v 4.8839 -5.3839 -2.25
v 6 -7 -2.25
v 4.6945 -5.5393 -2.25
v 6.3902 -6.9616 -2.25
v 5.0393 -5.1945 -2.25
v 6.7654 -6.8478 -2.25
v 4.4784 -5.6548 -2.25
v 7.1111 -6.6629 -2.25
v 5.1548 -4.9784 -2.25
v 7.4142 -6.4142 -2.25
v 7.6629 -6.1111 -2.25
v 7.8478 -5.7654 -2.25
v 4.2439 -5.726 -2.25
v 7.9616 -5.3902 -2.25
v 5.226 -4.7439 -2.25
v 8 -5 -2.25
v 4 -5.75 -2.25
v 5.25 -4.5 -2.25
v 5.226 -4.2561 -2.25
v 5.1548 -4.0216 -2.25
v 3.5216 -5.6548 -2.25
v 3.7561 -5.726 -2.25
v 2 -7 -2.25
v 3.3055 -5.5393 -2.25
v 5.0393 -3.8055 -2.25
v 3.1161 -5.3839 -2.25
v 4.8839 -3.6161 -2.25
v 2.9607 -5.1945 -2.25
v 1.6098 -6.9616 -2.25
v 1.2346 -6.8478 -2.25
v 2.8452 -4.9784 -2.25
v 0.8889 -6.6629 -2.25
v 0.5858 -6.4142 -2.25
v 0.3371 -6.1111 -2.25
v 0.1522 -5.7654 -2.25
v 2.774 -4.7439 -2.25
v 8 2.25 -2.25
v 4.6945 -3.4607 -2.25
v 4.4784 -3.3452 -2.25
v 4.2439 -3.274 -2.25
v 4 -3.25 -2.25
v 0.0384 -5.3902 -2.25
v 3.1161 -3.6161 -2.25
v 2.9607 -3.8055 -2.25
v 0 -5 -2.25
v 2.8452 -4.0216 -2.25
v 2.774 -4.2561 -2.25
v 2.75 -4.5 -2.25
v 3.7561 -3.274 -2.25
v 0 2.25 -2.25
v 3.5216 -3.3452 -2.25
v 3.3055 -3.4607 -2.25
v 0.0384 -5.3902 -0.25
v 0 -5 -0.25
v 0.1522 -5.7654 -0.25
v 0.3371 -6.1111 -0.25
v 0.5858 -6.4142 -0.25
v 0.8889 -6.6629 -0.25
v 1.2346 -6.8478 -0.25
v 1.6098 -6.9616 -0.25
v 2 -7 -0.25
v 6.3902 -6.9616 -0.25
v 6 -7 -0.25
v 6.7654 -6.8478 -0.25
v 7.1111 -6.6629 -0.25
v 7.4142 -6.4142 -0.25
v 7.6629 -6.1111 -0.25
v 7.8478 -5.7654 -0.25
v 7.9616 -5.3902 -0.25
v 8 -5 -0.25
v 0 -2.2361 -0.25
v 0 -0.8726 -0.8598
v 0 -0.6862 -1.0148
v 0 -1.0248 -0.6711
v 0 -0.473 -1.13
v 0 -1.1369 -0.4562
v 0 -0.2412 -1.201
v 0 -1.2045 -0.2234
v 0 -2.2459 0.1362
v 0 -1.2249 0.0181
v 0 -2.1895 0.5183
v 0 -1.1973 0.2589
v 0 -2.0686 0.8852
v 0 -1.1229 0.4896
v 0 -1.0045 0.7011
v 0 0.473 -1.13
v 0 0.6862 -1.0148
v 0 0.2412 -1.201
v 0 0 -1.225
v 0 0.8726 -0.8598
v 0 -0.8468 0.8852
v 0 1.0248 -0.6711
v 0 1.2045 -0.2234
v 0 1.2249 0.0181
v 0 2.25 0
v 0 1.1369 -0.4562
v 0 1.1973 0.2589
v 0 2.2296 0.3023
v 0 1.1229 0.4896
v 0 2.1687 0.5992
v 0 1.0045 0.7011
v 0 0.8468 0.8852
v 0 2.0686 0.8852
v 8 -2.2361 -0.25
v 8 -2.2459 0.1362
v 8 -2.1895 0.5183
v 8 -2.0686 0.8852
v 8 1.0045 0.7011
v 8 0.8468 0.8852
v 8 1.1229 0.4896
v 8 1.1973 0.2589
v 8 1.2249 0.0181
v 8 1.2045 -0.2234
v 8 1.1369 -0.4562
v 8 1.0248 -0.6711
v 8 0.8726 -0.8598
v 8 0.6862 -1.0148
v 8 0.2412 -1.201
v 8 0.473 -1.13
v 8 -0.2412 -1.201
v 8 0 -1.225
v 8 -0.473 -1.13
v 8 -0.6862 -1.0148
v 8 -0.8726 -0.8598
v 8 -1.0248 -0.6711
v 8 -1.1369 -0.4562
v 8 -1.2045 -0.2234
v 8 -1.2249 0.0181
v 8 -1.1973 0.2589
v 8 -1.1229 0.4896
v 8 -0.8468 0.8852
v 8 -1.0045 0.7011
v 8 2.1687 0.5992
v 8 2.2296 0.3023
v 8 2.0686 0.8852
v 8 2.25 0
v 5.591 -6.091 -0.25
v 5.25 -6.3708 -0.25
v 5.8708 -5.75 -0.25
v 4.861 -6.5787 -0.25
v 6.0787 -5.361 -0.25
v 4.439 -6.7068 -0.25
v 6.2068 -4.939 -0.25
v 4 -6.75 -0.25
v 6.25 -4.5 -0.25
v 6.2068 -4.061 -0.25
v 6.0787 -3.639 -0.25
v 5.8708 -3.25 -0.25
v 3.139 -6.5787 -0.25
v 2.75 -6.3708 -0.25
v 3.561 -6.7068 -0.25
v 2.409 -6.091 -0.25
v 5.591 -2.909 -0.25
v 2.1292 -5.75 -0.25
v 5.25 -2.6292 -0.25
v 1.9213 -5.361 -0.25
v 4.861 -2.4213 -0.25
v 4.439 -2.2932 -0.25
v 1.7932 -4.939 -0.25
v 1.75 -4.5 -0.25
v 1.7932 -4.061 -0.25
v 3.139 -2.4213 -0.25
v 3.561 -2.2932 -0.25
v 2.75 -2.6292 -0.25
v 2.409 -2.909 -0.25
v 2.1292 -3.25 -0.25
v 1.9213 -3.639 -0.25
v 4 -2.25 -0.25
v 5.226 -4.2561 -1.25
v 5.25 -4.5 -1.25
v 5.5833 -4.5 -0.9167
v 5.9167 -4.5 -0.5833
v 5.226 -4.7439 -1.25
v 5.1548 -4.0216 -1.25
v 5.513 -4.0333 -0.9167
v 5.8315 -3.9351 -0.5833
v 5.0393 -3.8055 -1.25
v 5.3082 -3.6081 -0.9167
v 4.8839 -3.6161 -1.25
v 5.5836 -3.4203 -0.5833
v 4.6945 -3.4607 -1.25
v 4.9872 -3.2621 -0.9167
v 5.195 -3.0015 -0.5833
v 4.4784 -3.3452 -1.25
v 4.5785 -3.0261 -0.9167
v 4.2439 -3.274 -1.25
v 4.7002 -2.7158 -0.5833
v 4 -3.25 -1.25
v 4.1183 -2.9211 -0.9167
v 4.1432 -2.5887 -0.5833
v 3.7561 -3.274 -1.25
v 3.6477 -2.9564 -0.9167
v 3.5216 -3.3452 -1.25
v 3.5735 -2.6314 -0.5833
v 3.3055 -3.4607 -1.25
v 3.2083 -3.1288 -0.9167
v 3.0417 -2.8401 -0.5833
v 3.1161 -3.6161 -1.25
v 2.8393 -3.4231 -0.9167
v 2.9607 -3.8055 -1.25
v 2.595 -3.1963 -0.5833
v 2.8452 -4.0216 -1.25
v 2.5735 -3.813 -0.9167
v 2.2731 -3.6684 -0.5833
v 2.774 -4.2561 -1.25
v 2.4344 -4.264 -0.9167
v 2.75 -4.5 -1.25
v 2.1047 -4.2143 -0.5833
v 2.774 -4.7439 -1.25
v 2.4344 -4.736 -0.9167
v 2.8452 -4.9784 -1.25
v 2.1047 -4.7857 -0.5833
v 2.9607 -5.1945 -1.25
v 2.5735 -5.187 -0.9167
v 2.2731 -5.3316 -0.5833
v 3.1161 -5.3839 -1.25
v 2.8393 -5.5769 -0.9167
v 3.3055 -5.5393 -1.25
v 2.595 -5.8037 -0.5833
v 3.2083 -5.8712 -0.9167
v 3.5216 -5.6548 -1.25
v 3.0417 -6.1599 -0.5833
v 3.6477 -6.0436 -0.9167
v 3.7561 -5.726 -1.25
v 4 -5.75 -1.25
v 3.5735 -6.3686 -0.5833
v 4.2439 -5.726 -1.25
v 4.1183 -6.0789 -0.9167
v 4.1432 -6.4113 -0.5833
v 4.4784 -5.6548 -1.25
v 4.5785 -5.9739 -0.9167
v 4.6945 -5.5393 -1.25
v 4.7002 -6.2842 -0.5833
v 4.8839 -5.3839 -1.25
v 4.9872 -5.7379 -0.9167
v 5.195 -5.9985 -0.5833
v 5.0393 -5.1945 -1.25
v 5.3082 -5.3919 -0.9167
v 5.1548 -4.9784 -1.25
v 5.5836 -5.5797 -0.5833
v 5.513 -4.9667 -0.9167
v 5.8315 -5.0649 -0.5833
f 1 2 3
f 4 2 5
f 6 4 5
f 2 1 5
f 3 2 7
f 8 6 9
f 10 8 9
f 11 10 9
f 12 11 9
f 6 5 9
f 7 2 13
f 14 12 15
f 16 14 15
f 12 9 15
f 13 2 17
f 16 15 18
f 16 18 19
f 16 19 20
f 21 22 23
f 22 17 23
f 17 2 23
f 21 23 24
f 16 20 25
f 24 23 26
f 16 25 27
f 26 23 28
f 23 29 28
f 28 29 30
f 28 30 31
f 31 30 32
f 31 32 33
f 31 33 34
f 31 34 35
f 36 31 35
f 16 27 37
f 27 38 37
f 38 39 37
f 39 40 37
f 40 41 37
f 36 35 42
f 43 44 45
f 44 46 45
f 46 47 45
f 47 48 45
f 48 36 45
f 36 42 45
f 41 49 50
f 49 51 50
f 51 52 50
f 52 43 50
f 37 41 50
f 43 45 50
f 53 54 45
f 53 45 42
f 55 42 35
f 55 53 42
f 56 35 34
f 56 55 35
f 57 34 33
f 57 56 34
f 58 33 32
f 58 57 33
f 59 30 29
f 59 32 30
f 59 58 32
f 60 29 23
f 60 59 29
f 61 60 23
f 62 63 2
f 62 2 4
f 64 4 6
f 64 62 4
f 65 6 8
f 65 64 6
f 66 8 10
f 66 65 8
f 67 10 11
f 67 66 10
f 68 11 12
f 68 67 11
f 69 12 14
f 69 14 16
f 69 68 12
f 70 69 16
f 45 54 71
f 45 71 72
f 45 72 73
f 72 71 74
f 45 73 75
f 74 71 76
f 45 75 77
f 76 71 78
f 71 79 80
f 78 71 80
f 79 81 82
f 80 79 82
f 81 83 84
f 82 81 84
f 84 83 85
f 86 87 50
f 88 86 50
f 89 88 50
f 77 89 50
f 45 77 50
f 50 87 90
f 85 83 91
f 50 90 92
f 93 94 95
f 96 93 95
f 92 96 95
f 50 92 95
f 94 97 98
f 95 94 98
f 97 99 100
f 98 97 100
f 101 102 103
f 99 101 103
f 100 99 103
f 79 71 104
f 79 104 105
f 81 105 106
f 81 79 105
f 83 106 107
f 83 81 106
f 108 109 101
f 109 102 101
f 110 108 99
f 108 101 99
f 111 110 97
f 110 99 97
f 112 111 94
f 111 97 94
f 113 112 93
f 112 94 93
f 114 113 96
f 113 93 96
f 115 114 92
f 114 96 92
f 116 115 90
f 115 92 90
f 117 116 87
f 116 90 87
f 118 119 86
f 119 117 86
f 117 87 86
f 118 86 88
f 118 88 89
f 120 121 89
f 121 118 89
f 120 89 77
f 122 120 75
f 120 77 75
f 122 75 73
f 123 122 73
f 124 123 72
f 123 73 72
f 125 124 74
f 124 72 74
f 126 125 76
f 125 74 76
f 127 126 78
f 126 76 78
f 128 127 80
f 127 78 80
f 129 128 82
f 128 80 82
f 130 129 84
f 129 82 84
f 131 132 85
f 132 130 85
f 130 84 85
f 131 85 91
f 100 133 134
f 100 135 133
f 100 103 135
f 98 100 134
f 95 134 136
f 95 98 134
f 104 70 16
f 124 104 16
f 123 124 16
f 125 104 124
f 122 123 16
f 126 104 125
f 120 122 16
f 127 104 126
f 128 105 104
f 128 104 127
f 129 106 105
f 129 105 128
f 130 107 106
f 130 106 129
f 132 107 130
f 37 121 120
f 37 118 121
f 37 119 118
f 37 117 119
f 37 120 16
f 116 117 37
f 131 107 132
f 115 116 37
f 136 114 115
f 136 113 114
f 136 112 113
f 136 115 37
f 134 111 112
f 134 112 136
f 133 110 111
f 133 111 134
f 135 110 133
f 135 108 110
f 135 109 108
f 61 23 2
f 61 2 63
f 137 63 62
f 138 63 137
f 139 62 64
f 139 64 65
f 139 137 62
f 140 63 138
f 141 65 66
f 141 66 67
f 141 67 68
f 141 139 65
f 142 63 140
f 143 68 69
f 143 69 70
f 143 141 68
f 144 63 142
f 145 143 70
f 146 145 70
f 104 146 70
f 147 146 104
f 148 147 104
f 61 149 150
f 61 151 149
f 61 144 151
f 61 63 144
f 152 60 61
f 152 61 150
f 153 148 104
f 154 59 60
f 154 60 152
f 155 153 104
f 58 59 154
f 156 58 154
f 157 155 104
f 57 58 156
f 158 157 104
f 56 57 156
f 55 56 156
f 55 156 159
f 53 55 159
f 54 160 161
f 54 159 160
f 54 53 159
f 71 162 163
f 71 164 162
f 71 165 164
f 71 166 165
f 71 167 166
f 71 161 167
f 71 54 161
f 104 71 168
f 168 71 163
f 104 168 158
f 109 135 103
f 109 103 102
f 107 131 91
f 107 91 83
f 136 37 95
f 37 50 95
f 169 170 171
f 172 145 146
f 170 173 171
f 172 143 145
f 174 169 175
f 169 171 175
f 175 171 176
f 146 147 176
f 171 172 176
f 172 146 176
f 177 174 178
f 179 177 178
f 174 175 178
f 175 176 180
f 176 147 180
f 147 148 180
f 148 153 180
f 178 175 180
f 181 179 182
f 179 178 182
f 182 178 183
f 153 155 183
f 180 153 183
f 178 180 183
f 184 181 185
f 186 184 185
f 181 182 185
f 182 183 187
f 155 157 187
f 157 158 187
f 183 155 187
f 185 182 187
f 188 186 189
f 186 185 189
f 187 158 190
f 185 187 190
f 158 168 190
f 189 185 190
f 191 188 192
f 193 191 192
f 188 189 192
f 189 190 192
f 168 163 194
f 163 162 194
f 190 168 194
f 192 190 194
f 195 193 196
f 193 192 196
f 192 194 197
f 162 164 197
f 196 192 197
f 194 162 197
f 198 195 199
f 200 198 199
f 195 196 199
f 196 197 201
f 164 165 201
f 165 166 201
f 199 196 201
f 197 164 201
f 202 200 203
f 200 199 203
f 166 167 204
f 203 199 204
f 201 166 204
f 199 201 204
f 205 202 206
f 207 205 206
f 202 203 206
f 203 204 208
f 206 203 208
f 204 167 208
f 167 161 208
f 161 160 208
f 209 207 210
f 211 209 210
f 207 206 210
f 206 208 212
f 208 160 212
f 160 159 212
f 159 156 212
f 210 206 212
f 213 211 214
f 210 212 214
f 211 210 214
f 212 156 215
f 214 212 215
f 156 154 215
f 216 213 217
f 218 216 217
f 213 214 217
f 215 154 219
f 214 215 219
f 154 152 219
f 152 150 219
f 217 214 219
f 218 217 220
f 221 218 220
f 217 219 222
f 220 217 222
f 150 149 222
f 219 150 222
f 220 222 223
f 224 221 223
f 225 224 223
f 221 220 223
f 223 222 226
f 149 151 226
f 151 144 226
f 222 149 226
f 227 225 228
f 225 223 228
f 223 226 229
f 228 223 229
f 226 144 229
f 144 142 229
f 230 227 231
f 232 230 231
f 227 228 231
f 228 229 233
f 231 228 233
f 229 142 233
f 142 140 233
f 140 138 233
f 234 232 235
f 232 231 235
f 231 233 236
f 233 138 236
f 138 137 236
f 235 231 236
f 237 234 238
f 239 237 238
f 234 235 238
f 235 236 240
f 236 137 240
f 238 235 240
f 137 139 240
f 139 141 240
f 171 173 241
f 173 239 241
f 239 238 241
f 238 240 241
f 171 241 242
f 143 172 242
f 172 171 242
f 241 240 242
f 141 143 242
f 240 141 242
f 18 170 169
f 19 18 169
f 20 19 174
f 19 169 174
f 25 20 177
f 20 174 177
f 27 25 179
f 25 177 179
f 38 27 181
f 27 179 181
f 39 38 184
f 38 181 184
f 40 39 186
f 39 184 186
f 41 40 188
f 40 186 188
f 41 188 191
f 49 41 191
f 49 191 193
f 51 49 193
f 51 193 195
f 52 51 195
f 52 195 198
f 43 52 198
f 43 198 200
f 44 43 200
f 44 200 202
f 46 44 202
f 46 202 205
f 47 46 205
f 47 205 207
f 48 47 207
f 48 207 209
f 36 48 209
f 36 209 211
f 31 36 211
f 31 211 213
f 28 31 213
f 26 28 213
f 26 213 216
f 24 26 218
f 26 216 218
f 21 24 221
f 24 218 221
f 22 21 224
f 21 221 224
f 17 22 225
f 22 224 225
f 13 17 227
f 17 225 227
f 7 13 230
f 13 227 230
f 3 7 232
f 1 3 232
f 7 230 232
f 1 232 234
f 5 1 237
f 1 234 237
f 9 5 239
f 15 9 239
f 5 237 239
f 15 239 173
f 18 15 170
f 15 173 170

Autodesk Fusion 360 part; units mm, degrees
sketch "Sketch1" plane through (0, 0, 0) normal (1, 0, 0) x (0, 1, 0)
  circle A0 centre (0, 0) radius 1.225
  circle A1 centre (0, 0) radius 2.25
  line L0 (0, -2.25) -> (-7, -2.25)
  line L1 (-7, -2.25) -> (-7, -0.25)
  line L2 (-7, -0.25) -> (0, -0.25)
  line L3 (0, -0.25) -> (0, -2.25)
  line L4 (-4.9672, 4.6123) -> (6.1553, 4.6123)
  line L5 (6.1553, 4.6123) -> (6.1553, 0.8852)
  line L6 (6.1553, 0.8852) -> (-4.9672, 0.8852)
  line L7 (-4.9672, 0.8852) -> (-4.9672, 4.6123)
  line L8 (0, -2.25) -> (2.25, -2.25)
  line L9 (2.25, -2.25) -> (2.25, 0)
  line L10 (2.25, 0) -> (0, 0)
  line L11 (0, 0) -> (0, -2.25)
  dimension "d1" = 2.45
  dimension "d2" = 4.5
  dimension "d3" = 7
  dimension "d4" = 2
  dimension "d5" = 2.25
  dimension "d6" = 2.25
extrude "Extrude1" add sketch "Sketch1" along normal blind 8 contours A0 A1 L3 L10 L11 | A0 A1 L6 L10 | A0 A1 L2 L3 L11 | A1 L8 L9 | A0 A1 L2 L6 | A1 L0 L1 L2
sketch "Sketch2" plane through (0, 0, 0) normal (0, 0, 1) x (1, 0, 0)
  circle A0 centre (4, -4.5) radius 1.25
  dimension "d9" = 2.5
extrude "Extrude2" cut sketch "Sketch2" against normal blind 6.5
chamfer "Chamfer1" distance 1 angle 45 1 edges at (2.8346, -4.048, -0.25)
fillet "Fillet1" radius 2 2 edges at (0, -7, -1.25) (8, -7, -1.25)
